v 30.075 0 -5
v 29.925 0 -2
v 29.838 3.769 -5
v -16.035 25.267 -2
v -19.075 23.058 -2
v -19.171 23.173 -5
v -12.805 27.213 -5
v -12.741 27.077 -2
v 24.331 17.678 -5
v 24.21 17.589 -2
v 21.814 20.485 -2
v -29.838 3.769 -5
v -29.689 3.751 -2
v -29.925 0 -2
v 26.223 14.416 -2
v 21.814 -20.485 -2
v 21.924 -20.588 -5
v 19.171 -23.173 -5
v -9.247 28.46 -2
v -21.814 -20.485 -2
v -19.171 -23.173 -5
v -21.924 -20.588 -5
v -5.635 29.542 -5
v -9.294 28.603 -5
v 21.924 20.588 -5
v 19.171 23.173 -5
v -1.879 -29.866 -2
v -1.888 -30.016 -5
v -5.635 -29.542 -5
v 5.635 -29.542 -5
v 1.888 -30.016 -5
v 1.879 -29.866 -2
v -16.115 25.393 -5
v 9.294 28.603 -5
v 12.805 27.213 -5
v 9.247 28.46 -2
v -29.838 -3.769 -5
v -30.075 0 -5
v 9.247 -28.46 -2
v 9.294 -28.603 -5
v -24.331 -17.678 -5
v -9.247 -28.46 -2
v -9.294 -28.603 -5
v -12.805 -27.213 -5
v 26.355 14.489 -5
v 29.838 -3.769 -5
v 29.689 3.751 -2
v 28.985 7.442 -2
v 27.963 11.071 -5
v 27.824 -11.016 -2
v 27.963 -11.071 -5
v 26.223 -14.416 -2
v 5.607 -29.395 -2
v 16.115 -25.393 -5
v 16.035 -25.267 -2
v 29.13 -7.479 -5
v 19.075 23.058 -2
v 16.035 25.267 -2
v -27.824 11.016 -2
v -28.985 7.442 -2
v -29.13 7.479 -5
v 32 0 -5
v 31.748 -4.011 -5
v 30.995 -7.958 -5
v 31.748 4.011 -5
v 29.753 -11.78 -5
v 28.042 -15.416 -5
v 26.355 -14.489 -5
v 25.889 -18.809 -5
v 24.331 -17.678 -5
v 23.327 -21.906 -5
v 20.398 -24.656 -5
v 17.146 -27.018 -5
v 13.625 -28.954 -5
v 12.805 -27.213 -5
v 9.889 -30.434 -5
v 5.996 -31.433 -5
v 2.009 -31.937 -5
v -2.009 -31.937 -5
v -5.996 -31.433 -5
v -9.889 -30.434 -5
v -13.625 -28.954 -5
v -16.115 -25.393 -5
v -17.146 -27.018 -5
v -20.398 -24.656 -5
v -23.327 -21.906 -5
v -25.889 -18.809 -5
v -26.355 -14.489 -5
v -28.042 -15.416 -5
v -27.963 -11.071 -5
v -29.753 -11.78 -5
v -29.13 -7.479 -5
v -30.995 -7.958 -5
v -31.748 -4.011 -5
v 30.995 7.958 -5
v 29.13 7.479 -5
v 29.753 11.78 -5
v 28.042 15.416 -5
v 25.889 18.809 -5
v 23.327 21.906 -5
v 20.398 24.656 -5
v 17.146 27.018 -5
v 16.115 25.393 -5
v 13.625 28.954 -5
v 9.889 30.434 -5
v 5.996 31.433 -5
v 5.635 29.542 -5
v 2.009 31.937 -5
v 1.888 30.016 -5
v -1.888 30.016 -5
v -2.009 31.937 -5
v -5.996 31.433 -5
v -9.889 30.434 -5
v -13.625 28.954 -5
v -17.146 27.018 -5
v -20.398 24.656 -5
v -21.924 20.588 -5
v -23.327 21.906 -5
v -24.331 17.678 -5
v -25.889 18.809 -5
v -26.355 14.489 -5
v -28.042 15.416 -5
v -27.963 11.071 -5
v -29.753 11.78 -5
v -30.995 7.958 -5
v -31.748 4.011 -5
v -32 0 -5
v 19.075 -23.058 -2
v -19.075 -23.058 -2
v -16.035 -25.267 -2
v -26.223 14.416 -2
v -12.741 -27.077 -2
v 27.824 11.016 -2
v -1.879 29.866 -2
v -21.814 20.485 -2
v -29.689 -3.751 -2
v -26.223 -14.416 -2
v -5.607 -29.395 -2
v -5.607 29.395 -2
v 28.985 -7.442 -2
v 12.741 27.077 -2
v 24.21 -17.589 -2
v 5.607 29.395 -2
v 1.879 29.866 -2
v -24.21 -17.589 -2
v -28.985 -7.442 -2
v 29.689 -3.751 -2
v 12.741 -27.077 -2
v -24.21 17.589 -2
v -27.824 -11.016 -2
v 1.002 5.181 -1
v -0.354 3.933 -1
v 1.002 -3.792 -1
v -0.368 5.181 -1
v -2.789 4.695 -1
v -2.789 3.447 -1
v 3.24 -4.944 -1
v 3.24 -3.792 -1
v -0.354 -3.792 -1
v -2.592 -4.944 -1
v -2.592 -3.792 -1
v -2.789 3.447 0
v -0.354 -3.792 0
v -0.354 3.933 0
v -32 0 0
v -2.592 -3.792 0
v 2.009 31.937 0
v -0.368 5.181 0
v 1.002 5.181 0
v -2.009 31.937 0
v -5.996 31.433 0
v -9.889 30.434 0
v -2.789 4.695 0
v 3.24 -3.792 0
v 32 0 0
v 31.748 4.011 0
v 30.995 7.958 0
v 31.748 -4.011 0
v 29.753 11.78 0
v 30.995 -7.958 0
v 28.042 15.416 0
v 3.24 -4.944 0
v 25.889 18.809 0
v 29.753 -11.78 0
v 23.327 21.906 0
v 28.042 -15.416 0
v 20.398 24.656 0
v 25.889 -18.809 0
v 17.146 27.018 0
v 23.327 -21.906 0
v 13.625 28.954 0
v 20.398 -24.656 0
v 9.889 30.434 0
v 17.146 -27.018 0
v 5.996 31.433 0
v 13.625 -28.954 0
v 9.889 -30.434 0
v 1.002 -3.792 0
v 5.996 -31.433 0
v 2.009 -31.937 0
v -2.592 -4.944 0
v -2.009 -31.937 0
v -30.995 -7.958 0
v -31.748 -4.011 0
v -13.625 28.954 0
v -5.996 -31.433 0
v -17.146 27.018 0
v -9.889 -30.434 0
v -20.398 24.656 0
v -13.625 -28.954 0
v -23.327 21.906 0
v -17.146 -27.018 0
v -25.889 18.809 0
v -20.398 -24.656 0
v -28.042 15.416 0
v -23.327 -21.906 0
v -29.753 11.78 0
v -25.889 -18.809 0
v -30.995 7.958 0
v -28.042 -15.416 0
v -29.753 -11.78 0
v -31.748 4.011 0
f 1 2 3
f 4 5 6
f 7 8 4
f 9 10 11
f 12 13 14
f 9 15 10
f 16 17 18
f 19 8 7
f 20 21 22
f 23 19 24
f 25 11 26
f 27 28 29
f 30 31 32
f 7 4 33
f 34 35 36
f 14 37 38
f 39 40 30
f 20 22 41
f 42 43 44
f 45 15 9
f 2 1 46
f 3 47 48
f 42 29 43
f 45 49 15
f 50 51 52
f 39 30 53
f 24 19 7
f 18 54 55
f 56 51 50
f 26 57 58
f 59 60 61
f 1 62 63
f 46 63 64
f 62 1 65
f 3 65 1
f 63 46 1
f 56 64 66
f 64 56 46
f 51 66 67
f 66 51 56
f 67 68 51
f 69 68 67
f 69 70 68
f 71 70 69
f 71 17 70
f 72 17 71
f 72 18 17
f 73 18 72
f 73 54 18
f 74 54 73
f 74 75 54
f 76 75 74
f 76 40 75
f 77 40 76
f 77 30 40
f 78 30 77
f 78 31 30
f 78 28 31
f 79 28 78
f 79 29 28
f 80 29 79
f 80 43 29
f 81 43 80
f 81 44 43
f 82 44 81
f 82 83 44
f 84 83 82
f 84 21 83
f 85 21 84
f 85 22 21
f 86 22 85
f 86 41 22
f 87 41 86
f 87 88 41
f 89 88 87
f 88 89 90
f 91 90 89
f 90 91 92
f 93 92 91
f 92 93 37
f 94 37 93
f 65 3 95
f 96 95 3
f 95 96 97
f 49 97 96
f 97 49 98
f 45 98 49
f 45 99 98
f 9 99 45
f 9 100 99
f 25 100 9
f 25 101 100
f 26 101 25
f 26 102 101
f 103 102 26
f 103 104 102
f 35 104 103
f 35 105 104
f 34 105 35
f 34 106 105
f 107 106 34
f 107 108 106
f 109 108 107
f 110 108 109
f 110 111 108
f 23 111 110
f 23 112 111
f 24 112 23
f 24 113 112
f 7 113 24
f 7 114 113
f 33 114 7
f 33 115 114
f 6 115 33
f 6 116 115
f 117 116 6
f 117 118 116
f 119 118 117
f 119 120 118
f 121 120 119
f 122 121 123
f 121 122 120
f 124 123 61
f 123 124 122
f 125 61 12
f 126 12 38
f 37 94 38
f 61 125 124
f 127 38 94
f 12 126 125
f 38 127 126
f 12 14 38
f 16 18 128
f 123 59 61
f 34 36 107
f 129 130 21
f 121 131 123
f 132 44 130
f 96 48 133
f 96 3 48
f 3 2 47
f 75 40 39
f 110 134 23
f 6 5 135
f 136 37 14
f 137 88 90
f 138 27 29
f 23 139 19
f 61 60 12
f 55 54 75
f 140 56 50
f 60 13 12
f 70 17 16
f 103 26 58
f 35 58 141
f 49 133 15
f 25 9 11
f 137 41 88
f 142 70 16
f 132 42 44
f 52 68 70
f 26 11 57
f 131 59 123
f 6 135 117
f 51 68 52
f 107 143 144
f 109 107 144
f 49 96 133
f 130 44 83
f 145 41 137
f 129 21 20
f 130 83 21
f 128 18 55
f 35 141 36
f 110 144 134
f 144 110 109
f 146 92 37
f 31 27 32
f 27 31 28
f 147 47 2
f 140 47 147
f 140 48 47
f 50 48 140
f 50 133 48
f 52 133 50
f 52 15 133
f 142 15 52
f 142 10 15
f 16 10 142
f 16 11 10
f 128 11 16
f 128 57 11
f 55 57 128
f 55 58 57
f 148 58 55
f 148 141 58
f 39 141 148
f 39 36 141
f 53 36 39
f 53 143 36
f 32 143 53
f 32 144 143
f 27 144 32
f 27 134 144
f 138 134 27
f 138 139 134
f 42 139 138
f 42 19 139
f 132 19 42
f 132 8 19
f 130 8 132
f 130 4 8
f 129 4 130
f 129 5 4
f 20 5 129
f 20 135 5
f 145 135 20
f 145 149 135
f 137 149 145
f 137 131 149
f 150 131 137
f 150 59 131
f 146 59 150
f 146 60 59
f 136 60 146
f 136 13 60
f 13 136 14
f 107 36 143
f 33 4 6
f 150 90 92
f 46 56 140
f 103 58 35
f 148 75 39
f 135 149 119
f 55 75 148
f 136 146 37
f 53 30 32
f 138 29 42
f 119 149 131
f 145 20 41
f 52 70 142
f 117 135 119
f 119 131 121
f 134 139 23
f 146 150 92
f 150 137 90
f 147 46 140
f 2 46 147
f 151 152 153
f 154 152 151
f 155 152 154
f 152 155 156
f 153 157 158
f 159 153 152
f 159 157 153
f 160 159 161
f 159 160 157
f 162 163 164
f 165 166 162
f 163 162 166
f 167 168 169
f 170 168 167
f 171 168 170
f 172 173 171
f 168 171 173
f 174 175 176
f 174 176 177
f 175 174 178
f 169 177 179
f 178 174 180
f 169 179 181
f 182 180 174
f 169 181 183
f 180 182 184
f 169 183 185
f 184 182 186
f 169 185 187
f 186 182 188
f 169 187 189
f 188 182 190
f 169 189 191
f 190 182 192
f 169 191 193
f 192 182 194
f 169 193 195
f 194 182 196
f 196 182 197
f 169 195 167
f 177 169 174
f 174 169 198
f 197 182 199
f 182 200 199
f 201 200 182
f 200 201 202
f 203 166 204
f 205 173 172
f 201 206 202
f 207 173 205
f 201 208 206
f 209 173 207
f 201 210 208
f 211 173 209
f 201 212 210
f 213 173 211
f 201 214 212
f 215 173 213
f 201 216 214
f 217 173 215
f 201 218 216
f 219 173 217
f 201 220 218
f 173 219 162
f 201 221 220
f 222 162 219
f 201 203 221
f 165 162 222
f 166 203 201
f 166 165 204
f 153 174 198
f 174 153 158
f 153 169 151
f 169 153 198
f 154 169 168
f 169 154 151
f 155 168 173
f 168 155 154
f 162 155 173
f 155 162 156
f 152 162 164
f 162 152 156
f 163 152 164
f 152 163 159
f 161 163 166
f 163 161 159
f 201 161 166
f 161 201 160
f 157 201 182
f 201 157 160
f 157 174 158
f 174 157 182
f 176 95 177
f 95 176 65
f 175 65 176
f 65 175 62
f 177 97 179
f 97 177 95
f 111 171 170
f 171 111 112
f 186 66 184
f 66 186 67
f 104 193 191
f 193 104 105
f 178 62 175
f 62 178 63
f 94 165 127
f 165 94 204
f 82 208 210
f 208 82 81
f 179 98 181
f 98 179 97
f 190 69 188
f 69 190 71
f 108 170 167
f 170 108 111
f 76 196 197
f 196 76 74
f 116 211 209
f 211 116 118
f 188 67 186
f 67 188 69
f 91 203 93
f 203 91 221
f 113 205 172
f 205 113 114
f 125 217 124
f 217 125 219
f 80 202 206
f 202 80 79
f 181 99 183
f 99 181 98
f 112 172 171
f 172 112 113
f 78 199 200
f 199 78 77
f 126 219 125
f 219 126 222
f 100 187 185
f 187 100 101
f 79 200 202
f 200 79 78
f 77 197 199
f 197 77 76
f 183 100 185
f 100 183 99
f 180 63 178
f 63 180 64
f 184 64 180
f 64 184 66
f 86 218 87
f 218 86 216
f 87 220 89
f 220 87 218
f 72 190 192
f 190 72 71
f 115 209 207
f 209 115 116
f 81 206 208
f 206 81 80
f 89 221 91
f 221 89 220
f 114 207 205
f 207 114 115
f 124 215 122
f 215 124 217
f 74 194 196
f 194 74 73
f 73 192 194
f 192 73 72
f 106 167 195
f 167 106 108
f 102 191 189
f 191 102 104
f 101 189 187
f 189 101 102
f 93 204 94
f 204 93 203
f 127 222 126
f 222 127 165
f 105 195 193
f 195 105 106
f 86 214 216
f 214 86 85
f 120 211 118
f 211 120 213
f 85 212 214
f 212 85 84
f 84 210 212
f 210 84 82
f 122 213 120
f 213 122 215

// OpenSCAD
$fn = 50;

difference() {
	union() {
		translate(v = [0, 0, -5.0]) {
			cylinder(h = 5, r = 32.0);
		}
	}
	union() {
		#translate(v = [0, 0, -5.0]) {
			cylinder(h = 3, r1 = 30.075, r2 = 29.925);
		}
		translate(v = [0, 0, -1]) {
			linear_extrude(height = 1) {
				text(font = "Impact", halign = "center", size = 10, text = "1", valign = "center");
			}
		}
	}
}
